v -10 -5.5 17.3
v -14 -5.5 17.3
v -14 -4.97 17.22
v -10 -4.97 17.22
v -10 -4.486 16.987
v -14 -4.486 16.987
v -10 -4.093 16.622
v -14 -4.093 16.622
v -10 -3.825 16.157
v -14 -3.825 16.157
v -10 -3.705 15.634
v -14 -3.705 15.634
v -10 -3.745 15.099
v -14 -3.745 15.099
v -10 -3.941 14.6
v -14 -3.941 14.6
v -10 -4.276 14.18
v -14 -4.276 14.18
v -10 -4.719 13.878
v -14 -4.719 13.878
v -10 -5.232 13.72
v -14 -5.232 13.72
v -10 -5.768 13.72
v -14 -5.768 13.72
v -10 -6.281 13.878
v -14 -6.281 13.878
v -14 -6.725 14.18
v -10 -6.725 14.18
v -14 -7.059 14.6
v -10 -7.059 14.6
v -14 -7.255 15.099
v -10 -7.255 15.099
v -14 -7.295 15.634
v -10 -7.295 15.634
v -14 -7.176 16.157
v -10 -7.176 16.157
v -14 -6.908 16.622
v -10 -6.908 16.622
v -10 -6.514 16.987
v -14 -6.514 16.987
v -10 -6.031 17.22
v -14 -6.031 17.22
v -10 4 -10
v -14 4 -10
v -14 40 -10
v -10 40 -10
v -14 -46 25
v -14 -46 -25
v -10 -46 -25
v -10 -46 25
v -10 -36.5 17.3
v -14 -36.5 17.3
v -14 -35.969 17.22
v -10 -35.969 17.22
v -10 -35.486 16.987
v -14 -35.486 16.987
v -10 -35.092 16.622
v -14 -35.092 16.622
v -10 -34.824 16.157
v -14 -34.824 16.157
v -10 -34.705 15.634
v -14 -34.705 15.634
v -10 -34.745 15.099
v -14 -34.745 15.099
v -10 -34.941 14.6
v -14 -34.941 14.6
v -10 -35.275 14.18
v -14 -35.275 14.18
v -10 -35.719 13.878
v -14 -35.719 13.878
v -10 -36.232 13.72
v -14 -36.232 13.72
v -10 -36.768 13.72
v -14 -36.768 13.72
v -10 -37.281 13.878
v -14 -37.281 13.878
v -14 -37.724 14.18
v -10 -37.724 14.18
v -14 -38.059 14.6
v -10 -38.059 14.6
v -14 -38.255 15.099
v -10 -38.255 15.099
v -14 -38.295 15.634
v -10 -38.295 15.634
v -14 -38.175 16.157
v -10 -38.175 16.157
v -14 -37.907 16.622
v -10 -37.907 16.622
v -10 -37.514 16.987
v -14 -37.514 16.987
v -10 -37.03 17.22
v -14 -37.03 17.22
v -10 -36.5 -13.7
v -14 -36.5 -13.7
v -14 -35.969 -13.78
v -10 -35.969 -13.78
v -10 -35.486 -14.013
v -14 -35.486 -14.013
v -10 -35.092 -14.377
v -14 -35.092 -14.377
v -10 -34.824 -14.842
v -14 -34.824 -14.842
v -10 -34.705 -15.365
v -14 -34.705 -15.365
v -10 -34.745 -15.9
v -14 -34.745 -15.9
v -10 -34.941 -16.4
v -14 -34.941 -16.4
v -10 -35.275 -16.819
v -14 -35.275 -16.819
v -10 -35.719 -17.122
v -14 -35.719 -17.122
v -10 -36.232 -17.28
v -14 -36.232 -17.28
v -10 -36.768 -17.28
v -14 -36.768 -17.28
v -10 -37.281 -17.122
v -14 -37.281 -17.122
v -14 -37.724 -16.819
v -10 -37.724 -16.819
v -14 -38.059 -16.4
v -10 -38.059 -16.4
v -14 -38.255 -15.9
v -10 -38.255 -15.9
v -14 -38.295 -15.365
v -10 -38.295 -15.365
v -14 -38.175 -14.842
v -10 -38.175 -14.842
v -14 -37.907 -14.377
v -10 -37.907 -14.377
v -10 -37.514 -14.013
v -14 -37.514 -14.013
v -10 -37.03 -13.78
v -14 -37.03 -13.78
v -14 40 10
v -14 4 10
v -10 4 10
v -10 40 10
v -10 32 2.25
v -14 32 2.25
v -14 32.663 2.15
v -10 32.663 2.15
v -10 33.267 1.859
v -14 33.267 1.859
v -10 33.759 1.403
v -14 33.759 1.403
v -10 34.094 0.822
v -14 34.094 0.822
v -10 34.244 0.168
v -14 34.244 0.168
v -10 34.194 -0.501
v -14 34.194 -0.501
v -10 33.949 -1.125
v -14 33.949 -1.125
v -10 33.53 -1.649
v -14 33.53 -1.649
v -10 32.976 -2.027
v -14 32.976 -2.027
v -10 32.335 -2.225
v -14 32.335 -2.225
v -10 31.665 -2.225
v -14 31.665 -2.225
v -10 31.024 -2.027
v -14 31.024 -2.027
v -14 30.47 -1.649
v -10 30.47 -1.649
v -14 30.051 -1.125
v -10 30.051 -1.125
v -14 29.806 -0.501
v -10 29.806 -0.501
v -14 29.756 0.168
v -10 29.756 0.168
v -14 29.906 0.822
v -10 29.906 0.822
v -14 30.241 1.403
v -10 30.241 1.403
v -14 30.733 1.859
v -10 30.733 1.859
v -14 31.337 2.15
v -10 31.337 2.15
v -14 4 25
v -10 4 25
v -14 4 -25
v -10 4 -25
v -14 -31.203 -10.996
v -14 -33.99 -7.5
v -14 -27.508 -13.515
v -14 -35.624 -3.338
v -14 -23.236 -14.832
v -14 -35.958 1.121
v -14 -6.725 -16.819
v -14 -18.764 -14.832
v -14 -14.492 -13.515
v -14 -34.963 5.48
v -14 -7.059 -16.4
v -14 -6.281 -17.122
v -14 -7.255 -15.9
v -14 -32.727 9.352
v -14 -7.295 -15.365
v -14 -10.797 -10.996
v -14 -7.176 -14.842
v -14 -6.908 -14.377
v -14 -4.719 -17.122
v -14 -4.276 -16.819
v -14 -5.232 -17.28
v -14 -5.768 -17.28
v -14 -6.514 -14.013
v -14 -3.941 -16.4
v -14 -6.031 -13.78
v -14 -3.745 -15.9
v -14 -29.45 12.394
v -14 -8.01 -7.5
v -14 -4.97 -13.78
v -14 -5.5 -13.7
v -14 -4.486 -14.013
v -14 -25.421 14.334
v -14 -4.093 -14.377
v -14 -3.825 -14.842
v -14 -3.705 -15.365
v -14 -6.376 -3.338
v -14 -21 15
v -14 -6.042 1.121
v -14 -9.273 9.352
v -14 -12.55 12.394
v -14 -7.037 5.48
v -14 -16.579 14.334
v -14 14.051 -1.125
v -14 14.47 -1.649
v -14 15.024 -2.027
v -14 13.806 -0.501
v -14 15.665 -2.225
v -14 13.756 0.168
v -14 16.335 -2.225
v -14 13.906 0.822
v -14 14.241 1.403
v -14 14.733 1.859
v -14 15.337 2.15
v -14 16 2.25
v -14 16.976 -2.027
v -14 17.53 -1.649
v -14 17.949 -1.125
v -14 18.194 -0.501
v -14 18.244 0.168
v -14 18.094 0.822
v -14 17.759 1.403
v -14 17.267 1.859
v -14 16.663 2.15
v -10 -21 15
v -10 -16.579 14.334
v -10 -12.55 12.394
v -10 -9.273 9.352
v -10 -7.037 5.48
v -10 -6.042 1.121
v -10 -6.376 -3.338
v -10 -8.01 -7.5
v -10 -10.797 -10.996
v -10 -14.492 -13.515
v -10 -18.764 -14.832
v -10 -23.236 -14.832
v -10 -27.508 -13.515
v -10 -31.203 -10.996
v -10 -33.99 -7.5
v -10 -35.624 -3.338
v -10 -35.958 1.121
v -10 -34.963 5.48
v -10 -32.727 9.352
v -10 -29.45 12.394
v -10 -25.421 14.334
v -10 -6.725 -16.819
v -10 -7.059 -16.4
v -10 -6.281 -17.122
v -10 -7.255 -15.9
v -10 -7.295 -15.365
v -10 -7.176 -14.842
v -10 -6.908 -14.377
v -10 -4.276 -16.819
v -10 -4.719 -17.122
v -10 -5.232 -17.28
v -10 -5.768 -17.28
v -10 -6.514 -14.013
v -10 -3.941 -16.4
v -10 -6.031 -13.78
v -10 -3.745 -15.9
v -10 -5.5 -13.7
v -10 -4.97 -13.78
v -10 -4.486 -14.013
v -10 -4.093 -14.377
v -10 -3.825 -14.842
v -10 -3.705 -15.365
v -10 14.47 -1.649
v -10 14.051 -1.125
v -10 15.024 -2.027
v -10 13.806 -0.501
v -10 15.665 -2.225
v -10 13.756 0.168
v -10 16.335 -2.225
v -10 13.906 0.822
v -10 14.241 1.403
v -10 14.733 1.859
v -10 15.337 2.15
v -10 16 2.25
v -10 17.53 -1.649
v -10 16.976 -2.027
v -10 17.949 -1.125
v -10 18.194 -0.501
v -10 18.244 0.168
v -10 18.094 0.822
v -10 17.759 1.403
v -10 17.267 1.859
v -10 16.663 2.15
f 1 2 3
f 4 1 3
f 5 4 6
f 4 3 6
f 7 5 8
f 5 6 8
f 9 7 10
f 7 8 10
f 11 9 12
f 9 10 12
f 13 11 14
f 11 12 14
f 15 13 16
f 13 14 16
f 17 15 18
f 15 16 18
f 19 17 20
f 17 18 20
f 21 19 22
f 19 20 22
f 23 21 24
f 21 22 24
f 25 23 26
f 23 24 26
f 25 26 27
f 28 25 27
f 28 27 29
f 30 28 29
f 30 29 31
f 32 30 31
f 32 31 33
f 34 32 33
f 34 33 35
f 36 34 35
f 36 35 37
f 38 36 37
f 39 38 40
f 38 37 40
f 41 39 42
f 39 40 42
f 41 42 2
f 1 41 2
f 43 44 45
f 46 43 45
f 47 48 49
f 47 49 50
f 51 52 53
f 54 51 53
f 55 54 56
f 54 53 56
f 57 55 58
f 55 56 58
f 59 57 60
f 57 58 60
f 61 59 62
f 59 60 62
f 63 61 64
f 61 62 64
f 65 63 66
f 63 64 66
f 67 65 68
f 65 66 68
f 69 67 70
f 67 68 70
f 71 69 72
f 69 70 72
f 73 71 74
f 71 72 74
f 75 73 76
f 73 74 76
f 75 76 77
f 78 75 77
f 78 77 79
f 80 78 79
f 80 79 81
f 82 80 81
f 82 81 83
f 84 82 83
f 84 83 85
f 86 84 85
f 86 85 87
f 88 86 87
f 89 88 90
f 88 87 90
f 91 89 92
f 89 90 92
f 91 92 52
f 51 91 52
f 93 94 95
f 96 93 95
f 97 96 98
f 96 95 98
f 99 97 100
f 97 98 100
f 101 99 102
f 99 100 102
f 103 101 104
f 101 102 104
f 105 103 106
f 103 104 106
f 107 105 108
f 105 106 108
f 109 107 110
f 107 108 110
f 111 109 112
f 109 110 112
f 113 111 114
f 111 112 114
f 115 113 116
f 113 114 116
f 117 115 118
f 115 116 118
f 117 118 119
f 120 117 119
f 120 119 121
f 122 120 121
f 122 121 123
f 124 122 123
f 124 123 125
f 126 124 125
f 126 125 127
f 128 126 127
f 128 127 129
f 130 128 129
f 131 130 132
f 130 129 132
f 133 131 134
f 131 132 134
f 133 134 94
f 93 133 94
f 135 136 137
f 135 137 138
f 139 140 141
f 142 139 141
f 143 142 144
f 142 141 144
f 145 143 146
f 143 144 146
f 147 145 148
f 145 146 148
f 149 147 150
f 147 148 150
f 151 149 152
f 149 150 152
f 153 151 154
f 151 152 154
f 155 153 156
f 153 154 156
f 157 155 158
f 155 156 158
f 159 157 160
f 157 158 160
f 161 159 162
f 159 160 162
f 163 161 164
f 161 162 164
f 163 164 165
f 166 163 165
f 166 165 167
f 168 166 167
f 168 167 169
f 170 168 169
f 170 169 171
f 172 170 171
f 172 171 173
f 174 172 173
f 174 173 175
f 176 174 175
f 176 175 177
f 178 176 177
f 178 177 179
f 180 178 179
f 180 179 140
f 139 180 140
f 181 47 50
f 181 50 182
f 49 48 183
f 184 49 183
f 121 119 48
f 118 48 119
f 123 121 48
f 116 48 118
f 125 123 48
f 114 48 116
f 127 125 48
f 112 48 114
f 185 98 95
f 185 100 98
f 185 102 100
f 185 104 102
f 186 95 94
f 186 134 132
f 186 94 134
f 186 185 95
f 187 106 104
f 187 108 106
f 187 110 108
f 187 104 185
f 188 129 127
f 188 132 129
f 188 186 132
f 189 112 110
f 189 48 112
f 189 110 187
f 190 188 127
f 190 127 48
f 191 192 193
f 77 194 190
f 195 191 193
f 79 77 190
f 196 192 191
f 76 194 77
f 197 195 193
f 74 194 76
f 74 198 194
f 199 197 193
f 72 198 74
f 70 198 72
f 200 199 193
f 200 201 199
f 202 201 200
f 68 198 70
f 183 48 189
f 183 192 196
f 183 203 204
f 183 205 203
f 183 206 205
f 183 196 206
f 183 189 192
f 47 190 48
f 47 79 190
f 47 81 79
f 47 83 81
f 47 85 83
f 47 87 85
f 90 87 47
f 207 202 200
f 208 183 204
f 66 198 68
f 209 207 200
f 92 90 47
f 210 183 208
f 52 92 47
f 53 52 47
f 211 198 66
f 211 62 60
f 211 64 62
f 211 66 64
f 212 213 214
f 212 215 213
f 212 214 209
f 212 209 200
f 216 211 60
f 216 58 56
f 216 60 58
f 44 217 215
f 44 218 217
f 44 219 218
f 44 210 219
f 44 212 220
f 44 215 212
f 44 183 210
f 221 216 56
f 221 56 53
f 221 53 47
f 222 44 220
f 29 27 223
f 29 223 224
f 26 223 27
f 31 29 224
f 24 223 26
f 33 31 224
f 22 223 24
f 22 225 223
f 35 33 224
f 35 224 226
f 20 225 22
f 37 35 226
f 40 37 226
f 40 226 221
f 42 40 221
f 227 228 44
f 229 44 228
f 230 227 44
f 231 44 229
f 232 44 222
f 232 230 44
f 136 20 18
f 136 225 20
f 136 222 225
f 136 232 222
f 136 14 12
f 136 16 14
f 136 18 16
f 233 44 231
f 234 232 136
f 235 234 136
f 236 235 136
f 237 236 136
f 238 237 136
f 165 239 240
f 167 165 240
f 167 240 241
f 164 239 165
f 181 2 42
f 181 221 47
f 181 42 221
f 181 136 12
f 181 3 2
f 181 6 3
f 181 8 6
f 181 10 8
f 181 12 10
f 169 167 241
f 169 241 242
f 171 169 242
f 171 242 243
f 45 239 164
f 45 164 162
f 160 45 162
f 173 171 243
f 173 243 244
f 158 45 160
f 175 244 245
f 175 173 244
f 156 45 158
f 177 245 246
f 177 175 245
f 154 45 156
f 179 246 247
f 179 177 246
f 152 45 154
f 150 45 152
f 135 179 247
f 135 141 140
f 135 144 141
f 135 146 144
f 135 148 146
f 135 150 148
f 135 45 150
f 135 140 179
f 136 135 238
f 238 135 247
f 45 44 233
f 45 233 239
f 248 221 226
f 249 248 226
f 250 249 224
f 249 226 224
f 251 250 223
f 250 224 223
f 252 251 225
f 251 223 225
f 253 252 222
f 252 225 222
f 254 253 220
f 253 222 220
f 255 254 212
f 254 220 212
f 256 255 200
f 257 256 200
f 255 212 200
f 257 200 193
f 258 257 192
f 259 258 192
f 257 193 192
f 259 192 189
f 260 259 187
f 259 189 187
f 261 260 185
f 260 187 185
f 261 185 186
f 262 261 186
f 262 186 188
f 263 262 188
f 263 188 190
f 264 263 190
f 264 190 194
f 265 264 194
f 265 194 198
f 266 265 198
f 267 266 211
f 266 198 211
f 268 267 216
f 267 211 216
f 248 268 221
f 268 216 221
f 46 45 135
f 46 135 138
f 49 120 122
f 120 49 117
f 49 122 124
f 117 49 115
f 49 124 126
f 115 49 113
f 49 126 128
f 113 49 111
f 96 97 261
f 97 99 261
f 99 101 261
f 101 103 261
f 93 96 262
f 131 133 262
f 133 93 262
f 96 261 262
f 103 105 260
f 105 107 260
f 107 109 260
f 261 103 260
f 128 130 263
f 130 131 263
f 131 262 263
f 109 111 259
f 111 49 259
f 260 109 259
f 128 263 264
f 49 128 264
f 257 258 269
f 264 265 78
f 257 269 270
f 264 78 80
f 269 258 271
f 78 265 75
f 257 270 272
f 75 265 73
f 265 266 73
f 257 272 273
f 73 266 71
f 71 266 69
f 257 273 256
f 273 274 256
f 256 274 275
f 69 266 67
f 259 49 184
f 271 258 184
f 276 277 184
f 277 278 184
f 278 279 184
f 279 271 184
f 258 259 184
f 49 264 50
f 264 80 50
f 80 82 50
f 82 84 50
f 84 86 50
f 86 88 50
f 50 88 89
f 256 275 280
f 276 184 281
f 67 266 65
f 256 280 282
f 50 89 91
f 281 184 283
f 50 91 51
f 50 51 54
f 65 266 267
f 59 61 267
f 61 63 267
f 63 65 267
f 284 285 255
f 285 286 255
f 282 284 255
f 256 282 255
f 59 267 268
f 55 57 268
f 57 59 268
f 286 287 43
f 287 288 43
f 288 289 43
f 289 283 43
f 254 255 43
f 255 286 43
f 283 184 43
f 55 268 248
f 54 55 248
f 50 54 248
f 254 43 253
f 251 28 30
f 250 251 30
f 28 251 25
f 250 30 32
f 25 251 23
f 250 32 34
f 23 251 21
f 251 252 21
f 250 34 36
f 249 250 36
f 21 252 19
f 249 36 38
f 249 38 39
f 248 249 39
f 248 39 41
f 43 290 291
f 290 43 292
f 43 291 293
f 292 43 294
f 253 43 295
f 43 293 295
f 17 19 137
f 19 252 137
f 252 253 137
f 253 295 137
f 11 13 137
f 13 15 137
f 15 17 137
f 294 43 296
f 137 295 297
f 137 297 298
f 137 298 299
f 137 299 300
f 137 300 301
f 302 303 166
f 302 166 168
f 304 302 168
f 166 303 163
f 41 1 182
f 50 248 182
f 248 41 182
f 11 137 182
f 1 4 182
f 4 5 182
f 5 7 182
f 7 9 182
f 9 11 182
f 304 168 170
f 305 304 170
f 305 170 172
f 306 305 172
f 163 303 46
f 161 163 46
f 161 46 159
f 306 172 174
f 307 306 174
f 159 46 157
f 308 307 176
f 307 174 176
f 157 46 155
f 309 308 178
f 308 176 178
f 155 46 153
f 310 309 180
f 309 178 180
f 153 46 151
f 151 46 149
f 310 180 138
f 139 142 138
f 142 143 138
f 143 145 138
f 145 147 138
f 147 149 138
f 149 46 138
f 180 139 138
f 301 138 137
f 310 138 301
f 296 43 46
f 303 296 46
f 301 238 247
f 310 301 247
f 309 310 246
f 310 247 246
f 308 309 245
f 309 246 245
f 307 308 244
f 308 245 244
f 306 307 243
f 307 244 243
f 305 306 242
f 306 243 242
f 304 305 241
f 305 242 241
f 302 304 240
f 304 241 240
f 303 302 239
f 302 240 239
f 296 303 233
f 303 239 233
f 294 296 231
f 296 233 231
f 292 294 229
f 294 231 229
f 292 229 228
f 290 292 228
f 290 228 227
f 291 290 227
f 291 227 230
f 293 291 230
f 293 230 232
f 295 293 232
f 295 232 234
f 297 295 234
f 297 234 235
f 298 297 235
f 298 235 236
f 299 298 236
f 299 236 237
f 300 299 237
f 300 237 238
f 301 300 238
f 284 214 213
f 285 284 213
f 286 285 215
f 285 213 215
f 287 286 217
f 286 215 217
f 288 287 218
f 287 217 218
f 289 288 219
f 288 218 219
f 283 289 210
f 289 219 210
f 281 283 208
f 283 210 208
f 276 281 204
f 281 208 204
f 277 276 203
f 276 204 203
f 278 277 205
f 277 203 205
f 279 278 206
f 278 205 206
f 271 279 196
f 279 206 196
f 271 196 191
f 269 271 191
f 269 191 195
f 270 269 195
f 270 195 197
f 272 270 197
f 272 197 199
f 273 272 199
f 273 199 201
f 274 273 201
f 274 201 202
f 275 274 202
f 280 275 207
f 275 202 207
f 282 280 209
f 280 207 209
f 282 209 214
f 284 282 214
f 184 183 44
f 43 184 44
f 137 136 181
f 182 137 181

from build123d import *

# Parameters (mm, degrees)
SKETCH1_W           = 28
SKETCH1_H           = 28
SKETCH1_W_2         = 20
SKETCH1_H_2         = 20
BOSS_EXTRUDE1_DEPTH = 40
SKETCH2_R           = 2.25
CUT_EXTRUDE1_DEPTH  = 30
SKETCH5_W           = 50
SKETCH5_H           = 50
SKETCH5_R           = 1.8
SKETCH5_R_2         = 15
BOSS_EXTRUDE2_DEPTH = 4
SKETCH6_W           = 24
SKETCH6_H           = 28
CUT_EXTRUDE2_DEPTH  = 40
SKETCH7_W           = 4
SKETCH7_H           = 36
CUT_EXTRUDE3_DEPTH  = 4


with BuildPart() as part:
    # Sketch1 → Boss-Extrude1 (new body)
    with BuildSketch(Plane(origin=(0, 0, 0), x_dir=(1, 0, 0), z_dir=(0, 1, 0))):
        Rectangle(SKETCH1_W, SKETCH1_H)
        Rectangle(SKETCH1_W_2, SKETCH1_H_2, mode=Mode.SUBTRACT)
    extrude(amount=BOSS_EXTRUDE1_DEPTH)

    # Sketch2 → Cut-Extrude1 (cut)
    with BuildSketch(Plane.ZY.offset(14)):
        with Locations((0, 32)):
            Circle(SKETCH2_R)
        with Locations((0, 16)):
            Circle(SKETCH2_R)
    extrude(amount=-CUT_EXTRUDE1_DEPTH, mode=Mode.SUBTRACT)

    # Sketch5 → Boss-Extrude2 (add)
    with BuildSketch(Plane.ZY.offset(14)):
        with Locations((0, -21)):
            Rectangle(SKETCH5_W, SKETCH5_H)
        with Locations((-15.499780644, -5.500219356)):
            Circle(SKETCH5_R, mode=Mode.SUBTRACT)
        with Locations((15.499780644, -5.500219356)):
            Circle(SKETCH5_R, mode=Mode.SUBTRACT)
        with Locations((15.499780644, -36.499780644)):
            Circle(SKETCH5_R, mode=Mode.SUBTRACT)
        with Locations((-15.499780644, -36.499780644)):
            Circle(SKETCH5_R, mode=Mode.SUBTRACT)
        with Locations((0, -21)):
            Circle(SKETCH5_R_2, mode=Mode.SUBTRACT)
    extrude(amount=-BOSS_EXTRUDE2_DEPTH)

    # Sketch6 → Cut-Extrude2 (cut)
    with BuildSketch(Plane.XZ):
        with Locations((2, 0)):
            Rectangle(SKETCH6_W, SKETCH6_H)
    extrude(amount=-CUT_EXTRUDE2_DEPTH, mode=Mode.SUBTRACT)

    # Sketch7 → Cut-Extrude3 (cut)
    with BuildSketch(Plane.ZY.offset(14)):
        with Locations((-12, 22)):
            Rectangle(SKETCH7_W, SKETCH7_H)
        with Locations((12, 22)):
            Rectangle(SKETCH7_W, SKETCH7_H)
    extrude(amount=-CUT_EXTRUDE3_DEPTH, mode=Mode.SUBTRACT)


solid = part.part
